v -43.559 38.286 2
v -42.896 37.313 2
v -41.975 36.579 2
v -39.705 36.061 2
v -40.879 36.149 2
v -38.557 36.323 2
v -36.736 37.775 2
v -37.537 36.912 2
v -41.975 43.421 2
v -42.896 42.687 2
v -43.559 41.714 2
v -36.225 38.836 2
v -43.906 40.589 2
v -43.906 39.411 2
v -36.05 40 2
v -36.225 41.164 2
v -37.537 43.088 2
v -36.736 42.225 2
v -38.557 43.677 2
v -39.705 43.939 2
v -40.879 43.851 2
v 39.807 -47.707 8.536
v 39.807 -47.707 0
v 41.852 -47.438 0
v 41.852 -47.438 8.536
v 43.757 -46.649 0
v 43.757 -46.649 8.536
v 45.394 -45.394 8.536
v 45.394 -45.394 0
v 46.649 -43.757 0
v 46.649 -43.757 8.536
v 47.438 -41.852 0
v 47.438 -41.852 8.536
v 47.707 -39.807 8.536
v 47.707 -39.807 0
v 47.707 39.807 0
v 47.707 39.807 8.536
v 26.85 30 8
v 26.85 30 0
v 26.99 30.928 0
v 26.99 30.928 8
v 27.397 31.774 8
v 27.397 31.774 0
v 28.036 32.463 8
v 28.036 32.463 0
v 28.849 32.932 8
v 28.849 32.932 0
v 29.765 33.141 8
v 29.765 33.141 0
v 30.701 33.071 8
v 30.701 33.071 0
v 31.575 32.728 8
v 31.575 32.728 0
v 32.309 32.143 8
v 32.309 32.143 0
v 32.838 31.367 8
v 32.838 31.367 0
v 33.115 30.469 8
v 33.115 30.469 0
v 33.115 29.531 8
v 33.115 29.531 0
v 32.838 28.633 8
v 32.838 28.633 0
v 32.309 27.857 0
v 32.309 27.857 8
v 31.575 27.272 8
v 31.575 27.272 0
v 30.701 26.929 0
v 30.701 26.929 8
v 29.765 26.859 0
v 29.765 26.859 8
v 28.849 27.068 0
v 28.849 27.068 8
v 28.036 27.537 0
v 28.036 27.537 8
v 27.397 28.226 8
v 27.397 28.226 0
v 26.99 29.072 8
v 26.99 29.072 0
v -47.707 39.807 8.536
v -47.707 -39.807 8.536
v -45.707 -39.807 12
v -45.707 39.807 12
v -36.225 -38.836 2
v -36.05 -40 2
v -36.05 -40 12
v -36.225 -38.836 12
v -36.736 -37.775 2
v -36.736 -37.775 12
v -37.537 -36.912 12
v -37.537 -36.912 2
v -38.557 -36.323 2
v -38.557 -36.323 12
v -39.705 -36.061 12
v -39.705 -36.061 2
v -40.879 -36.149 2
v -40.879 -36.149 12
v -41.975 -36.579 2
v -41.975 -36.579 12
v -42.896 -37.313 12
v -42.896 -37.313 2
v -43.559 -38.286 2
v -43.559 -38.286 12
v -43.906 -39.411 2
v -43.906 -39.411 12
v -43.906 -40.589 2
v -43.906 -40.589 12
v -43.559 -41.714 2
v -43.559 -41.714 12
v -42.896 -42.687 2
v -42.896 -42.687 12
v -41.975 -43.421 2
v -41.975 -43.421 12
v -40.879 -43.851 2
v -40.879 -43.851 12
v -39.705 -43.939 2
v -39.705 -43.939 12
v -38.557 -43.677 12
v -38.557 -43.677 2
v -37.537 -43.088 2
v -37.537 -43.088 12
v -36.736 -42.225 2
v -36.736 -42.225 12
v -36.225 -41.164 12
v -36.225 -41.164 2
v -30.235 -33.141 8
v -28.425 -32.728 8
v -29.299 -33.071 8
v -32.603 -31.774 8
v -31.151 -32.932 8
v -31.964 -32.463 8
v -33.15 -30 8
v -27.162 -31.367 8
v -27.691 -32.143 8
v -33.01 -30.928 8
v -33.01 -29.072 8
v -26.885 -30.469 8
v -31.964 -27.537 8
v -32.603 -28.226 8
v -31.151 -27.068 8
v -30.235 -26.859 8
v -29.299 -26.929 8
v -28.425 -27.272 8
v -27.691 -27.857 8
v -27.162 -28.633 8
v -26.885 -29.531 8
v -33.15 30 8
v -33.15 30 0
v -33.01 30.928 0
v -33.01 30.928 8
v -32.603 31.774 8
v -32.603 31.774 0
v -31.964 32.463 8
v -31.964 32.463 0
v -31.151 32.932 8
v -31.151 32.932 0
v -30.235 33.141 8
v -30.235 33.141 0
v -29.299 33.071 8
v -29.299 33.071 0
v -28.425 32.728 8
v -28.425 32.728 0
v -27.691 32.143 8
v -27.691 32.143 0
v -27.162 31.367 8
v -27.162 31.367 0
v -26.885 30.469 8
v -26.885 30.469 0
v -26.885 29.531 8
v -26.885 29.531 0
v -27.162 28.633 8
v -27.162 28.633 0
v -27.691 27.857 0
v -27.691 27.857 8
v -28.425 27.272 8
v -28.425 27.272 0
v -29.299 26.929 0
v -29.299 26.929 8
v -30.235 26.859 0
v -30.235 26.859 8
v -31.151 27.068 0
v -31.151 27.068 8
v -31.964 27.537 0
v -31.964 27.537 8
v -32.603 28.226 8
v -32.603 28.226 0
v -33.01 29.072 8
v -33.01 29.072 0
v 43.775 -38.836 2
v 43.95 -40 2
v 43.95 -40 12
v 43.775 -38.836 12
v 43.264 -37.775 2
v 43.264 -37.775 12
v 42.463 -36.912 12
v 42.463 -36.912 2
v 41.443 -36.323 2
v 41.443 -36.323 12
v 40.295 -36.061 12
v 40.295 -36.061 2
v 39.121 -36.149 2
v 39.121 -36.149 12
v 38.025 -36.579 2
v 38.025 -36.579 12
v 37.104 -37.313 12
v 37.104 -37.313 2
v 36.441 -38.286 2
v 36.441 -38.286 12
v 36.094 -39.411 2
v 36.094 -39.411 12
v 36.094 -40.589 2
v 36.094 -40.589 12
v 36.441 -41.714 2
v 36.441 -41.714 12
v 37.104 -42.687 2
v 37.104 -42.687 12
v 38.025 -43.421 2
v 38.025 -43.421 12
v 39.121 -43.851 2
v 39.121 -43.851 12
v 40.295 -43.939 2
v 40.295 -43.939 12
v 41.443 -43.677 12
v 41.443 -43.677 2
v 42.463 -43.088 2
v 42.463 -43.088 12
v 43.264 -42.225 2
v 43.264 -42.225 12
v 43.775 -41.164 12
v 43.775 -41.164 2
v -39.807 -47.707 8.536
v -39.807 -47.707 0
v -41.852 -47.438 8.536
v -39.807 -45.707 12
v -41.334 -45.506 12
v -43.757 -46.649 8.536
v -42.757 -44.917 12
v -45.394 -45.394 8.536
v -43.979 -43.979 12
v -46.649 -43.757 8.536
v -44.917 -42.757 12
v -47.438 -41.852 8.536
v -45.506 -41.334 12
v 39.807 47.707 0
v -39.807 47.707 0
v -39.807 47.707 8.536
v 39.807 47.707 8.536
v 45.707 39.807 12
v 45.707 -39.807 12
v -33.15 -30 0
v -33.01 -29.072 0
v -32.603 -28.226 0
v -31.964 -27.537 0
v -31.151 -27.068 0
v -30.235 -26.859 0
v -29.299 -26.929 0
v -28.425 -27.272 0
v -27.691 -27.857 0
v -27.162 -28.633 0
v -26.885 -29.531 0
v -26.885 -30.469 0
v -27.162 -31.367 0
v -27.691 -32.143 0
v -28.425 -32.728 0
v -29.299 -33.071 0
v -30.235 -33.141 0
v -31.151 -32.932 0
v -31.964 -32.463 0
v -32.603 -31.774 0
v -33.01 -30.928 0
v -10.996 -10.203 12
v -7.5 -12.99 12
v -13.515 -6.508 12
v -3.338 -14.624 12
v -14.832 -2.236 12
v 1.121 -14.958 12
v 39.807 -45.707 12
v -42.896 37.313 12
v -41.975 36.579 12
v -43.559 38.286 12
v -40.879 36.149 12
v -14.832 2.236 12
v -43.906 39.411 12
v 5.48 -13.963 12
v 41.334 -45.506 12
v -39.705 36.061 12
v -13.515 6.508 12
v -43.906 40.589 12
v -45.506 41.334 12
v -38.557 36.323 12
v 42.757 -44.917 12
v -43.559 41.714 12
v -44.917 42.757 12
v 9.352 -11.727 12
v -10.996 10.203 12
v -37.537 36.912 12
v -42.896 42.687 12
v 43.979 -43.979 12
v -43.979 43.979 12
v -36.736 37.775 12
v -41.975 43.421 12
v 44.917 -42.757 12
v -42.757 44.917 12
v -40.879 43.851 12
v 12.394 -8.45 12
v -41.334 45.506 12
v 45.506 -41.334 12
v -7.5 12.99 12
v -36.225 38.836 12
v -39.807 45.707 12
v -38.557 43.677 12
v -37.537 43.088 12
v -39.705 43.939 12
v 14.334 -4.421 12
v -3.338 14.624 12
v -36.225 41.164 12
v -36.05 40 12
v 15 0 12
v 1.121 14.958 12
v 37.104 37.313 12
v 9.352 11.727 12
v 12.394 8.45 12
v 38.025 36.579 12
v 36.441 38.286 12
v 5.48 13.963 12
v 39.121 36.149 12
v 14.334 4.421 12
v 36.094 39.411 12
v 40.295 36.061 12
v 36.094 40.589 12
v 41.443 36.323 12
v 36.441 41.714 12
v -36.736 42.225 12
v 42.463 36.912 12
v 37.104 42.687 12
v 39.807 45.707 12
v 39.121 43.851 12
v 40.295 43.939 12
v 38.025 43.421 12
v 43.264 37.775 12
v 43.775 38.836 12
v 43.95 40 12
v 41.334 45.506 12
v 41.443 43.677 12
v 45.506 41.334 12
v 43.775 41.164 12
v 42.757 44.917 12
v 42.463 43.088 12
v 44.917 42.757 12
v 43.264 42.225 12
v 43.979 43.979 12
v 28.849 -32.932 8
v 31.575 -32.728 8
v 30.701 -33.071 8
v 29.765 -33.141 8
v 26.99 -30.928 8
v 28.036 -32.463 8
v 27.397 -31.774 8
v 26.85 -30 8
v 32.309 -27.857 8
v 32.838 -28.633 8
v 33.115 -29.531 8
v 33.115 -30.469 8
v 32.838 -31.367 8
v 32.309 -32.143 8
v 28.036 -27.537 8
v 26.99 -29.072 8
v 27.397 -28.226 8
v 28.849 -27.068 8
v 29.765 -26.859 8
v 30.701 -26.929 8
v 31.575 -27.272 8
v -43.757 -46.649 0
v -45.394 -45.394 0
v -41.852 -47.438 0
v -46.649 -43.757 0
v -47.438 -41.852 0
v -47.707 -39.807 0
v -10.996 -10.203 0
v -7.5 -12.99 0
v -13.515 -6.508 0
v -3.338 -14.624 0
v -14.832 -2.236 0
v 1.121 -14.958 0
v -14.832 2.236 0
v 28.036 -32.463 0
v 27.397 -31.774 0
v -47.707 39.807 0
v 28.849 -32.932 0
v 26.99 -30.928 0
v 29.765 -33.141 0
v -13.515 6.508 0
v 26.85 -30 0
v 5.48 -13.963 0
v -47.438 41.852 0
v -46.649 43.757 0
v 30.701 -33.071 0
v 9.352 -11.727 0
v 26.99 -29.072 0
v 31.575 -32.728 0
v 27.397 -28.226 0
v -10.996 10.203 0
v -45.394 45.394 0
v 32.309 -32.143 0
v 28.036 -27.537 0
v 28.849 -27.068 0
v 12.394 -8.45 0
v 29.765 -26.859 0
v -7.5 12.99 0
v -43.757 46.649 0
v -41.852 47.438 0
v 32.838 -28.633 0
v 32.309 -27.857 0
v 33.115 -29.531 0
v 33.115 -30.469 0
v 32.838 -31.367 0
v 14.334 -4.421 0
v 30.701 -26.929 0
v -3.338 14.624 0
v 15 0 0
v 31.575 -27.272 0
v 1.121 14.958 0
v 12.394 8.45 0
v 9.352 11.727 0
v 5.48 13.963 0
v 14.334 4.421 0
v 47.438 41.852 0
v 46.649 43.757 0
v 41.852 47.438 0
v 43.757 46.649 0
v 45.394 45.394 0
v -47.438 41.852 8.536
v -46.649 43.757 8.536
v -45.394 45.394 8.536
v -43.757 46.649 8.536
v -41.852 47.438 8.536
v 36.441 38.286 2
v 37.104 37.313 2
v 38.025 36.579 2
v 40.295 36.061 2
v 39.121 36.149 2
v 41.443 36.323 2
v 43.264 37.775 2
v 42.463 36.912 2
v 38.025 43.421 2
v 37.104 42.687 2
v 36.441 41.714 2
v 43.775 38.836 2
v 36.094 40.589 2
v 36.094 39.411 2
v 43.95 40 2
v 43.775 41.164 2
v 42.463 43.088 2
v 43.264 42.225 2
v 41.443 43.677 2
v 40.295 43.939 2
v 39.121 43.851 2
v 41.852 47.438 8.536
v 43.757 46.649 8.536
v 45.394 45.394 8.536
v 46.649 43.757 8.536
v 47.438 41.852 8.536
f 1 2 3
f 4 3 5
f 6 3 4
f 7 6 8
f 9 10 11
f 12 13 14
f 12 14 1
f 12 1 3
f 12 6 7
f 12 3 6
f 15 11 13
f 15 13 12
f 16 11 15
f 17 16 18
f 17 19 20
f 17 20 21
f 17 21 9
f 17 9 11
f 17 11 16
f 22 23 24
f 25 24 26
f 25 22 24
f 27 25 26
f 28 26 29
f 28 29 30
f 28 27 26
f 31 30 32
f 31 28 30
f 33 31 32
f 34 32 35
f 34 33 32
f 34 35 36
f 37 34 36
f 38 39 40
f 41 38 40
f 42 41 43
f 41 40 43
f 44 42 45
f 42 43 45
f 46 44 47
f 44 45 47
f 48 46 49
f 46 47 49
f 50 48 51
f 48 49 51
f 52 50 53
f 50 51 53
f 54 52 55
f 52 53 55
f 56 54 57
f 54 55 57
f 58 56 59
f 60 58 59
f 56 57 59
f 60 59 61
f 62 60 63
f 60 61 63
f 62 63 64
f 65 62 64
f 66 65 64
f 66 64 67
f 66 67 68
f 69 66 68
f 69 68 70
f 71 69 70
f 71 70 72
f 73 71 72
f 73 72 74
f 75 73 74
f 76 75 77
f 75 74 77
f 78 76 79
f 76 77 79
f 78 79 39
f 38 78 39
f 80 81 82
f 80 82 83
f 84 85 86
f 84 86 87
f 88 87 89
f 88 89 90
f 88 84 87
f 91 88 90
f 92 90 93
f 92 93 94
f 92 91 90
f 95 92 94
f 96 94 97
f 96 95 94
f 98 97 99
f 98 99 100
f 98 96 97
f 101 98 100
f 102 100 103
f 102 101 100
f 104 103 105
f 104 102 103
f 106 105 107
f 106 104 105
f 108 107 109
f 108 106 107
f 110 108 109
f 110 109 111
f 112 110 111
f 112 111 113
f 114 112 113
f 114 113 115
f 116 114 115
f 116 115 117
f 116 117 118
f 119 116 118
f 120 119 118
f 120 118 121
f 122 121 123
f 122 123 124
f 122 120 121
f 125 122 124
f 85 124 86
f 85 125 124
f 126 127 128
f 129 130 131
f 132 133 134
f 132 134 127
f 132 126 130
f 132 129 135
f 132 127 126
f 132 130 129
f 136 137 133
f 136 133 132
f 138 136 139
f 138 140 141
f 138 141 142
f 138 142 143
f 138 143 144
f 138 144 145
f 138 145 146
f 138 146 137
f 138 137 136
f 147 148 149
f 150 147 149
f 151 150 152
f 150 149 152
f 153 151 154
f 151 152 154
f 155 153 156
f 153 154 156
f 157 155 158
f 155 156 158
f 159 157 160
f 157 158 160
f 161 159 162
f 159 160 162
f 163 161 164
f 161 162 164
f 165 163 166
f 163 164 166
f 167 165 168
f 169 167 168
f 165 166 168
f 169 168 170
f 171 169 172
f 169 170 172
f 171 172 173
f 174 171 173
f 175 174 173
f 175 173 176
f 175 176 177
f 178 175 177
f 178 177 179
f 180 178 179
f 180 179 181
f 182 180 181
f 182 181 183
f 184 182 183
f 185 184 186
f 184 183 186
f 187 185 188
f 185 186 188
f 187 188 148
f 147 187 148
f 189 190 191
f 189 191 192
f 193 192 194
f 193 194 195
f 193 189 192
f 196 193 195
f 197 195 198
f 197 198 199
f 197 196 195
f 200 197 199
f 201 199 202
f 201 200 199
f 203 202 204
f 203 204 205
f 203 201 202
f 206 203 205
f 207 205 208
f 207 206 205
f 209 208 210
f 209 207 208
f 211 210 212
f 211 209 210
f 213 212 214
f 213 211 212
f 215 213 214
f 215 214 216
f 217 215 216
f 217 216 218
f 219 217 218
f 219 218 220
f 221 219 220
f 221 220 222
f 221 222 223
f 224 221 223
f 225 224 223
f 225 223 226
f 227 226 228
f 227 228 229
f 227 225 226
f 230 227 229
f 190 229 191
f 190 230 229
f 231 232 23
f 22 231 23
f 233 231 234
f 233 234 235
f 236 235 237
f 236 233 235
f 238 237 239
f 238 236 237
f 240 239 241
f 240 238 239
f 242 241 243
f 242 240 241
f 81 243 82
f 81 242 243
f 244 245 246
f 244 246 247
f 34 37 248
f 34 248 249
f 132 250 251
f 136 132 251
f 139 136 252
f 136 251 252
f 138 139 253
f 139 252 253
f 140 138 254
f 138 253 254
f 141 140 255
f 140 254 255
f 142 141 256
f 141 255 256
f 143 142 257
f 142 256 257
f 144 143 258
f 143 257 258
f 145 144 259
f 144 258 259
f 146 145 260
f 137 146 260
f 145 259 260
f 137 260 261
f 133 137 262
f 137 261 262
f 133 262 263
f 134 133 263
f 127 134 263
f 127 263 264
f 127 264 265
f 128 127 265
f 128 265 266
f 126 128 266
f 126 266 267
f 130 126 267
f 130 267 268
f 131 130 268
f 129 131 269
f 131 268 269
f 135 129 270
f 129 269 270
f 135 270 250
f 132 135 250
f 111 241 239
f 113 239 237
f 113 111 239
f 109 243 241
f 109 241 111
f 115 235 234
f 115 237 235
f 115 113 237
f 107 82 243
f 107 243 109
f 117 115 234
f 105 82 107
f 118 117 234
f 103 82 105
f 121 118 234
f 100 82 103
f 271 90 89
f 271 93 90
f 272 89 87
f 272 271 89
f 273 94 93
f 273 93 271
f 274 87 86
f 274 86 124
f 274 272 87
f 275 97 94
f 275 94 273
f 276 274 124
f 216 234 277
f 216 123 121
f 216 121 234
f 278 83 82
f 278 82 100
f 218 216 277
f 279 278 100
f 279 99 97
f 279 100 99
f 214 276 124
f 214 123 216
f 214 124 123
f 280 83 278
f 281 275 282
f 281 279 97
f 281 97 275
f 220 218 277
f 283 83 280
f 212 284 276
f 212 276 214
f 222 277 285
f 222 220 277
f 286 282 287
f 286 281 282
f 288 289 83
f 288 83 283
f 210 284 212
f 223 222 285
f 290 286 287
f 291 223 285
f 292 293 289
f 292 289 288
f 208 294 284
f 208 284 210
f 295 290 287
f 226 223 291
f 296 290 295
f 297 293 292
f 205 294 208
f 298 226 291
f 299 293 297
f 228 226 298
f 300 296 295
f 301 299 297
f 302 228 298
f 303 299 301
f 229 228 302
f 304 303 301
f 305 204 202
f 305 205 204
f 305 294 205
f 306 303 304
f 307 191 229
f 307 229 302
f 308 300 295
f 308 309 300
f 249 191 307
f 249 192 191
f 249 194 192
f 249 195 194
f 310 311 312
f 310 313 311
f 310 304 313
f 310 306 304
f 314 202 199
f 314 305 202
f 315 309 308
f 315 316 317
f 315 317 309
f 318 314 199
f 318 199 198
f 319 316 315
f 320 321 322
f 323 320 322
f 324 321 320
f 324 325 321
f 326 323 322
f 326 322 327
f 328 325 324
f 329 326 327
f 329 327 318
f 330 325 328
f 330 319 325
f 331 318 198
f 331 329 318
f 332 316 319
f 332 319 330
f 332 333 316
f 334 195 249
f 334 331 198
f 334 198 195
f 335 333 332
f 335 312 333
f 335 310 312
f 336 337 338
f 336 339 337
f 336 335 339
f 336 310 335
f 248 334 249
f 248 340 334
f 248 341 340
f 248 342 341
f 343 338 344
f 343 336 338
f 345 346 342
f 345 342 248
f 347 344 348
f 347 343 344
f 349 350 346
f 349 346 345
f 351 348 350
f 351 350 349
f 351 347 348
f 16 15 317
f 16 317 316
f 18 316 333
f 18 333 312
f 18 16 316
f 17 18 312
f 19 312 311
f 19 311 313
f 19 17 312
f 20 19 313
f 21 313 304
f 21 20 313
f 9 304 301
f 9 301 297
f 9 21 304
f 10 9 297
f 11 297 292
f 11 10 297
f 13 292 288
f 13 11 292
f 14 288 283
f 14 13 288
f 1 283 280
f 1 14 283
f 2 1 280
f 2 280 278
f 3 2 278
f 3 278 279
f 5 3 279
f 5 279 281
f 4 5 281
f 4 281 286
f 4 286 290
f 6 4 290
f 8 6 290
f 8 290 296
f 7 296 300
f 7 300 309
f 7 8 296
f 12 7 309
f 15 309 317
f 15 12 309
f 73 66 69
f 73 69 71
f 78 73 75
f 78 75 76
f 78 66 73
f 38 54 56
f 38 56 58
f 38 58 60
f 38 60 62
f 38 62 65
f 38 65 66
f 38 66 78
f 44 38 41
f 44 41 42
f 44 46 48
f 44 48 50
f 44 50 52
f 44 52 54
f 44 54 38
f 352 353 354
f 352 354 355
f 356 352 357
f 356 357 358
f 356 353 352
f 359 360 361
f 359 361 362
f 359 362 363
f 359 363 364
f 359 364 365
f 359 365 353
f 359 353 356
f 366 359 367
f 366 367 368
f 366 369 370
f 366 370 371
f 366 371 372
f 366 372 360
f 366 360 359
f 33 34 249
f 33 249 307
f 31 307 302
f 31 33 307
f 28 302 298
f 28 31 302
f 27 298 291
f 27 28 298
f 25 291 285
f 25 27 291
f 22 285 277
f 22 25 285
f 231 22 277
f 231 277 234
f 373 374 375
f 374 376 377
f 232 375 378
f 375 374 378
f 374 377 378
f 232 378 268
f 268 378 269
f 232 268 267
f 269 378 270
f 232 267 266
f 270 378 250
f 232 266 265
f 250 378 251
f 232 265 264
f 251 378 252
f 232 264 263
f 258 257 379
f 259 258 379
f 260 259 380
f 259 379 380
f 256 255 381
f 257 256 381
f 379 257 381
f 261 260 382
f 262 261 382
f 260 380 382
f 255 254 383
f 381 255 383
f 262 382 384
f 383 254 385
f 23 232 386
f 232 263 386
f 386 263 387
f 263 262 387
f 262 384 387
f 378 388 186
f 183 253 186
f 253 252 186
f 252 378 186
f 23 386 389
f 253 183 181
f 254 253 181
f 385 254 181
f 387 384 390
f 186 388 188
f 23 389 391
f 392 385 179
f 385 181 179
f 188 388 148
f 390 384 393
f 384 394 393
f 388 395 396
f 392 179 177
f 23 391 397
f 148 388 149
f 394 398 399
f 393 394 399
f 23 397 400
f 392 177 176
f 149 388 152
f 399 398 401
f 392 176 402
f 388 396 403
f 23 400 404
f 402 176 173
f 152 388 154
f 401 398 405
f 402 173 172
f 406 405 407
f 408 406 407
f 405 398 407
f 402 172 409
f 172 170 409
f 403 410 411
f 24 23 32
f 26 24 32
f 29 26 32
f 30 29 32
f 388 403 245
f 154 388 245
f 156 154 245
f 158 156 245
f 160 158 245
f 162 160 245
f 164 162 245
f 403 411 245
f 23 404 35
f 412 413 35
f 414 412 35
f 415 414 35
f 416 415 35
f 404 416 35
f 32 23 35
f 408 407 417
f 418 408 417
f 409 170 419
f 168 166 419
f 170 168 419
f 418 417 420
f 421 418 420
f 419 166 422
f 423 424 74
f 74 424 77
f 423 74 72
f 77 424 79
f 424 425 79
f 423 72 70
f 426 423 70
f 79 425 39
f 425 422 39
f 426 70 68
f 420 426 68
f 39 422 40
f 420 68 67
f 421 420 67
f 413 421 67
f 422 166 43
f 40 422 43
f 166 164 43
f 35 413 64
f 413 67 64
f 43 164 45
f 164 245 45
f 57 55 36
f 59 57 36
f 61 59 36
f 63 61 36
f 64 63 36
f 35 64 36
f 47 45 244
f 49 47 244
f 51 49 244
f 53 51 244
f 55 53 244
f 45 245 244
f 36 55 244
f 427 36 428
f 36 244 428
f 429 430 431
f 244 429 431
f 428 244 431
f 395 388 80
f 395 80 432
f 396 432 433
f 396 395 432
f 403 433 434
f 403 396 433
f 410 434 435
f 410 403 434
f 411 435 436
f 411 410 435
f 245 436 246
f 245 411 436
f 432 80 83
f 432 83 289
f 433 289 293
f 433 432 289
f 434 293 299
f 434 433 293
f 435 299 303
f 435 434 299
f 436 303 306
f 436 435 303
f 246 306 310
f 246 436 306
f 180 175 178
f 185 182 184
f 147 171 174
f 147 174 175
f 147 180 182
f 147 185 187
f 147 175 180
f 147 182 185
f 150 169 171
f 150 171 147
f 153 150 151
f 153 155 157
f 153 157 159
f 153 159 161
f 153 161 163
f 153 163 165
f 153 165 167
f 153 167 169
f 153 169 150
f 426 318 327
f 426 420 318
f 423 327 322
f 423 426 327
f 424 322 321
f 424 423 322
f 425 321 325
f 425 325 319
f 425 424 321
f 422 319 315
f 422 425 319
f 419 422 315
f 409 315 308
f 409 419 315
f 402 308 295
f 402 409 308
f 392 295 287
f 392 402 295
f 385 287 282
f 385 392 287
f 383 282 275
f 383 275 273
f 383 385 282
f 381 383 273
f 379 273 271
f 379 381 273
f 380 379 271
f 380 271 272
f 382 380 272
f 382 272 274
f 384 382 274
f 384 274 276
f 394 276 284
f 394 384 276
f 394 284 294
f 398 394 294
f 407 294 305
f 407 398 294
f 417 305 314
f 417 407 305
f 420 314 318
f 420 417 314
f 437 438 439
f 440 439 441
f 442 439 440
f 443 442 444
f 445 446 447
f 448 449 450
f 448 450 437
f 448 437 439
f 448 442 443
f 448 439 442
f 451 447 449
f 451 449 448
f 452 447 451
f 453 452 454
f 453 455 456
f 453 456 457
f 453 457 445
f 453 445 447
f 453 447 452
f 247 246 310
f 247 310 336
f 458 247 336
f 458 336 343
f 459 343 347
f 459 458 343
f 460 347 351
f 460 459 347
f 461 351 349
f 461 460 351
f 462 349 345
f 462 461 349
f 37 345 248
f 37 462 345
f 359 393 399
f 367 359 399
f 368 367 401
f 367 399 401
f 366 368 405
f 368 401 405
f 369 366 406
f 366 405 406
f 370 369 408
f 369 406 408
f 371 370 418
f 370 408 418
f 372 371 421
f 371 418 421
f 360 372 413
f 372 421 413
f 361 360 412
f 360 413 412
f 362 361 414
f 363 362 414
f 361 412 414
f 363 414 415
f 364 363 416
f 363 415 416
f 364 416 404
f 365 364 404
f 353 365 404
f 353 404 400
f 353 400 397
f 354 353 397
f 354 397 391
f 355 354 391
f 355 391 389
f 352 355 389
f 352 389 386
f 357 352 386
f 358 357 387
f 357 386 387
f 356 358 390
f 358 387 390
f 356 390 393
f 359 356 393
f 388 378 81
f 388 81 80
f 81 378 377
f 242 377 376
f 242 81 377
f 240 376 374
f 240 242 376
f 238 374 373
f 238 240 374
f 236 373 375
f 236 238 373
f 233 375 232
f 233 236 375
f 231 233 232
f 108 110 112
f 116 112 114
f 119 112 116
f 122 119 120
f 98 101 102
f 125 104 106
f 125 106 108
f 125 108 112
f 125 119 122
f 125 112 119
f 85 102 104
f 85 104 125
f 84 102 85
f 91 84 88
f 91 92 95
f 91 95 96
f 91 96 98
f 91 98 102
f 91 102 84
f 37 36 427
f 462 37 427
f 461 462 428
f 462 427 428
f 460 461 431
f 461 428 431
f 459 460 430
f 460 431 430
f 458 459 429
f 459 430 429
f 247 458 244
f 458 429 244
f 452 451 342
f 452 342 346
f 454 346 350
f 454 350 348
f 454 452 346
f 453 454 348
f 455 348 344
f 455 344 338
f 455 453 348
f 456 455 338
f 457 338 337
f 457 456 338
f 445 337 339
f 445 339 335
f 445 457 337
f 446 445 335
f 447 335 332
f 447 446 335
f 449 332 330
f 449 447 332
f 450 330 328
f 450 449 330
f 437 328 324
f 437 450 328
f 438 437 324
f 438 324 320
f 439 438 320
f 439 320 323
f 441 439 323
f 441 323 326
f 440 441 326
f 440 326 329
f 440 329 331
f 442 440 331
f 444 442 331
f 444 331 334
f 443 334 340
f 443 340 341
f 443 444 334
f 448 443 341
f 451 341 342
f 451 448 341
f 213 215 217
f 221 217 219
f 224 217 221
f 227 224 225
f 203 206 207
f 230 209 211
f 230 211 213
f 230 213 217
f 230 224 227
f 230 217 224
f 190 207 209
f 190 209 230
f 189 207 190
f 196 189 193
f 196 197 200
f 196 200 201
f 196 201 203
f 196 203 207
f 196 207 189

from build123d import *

# Parameters (mm, degrees)
ESQUISSE1_W             = 95.41492783
ESQUISSE1_H             = 95.41492783
ESQUISSE1_R             = 3.95
ESQUISSE1_R_2           = 15
BOSS_EXTRU_1_DEPTH      = 2
BOSS_EXTRU_2_START      = 2
ESQUISSE1_3_W           = 95.41492783
ESQUISSE1_3_H           = 95.41492783
ESQUISSE1_3_R           = 15
ESQUISSE1_3_R_2         = 3.95
BOSS_EXTRU_2_DEPTH      = 10
CONG_1_R                = 7.9
CHANFREIN1_SIZE         = 2
CHANFREIN1_SIZE2        = 3.464101615
ESQUISSE4_R             = 3.15
ENL_V_MAT_EXTRU_2_DEPTH = 8


with BuildPart() as part:
    # Esquisse1 → Boss.-Extru.1 (new body)
    with BuildSketch(Plane.XY):
        Rectangle(ESQUISSE1_W, ESQUISSE1_H)
        with Locations((-40, -40)):
            Circle(ESQUISSE1_R, mode=Mode.SUBTRACT)
        with Locations((40, -40)):
            Circle(ESQUISSE1_R, mode=Mode.SUBTRACT)
        with Locations((40, 40)):
            Circle(ESQUISSE1_R, mode=Mode.SUBTRACT)
        with Locations((-40, 40)):
            Circle(ESQUISSE1_R, mode=Mode.SUBTRACT)
        Circle(ESQUISSE1_R_2, mode=Mode.SUBTRACT)
        with Locations((-40, -40)):
            Circle(ESQUISSE1_R)
        with Locations((40, -40)):
            Circle(ESQUISSE1_R)
        with Locations((40, 40)):
            Circle(ESQUISSE1_R)
        with Locations((-40, 40)):
            Circle(ESQUISSE1_R)
    extrude(amount=BOSS_EXTRU_1_DEPTH)

    # Esquisse1<3> → Boss.-Extru.2 (add)
    with BuildSketch(Plane.XY.offset(BOSS_EXTRU_2_START)):
        Rectangle(ESQUISSE1_3_W, ESQUISSE1_3_H)
        Circle(ESQUISSE1_3_R, mode=Mode.SUBTRACT)
        with Locations((-40, 40)):
            Circle(ESQUISSE1_3_R_2, mode=Mode.SUBTRACT)
        with Locations((40, 40)):
            Circle(ESQUISSE1_3_R_2, mode=Mode.SUBTRACT)
        with Locations((40, -40)):
            Circle(ESQUISSE1_3_R_2, mode=Mode.SUBTRACT)
        with Locations((-40, -40)):
            Circle(ESQUISSE1_3_R_2, mode=Mode.SUBTRACT)
    extrude(amount=BOSS_EXTRU_2_DEPTH)

    # Congé1
    cong_1_edges = [part.edges().sort_by_distance(p)[0] for p in [
        (-47.707463915, -47.707463915, 6),
        (-47.707463915, 47.707463915, 6),
        (47.707463915, 47.707463915, 6),
        (47.707463915, -47.707463915, 6),
    ]]
    fillet(cong_1_edges, radius=CONG_1_R)

    # Chanfrein1
    chanfrein1_edges = [part.edges().sort_by_distance(p)[0] for p in [
        (0, 47.707463915, 12),
        (47.707463915, 0, 12),
        (-47.707463915, 0, 12),
        (0, -47.707463915, 12),
        (-45.393607486, 45.393607486, 12),
        (-45.393607486, -45.393607486, 12),
        (45.393607486, -45.393607486, 12),
        (45.393607486, 45.393607486, 12),
    ]]
    chanfrein1_side = [part.faces().sort_by_distance(p)[0] for p in [
        (0, -46.358093065, 12),
    ]]
    chamfer(chanfrein1_edges, length=CHANFREIN1_SIZE, length2=CHANFREIN1_SIZE2, reference=chanfrein1_side[0])

    # Esquisse4 → Enlèv. mat.-Extru.2 (cut)
    with BuildSketch(Plane(origin=(0, 0, 0), x_dir=(-1, 0, 0), z_dir=(0, 0, -1))):
        with Locations((-30, 30)):
            Circle(ESQUISSE4_R)
        with Locations((-30, -30)):
            Circle(ESQUISSE4_R)
        with Locations((30, -30)):
            Circle(ESQUISSE4_R)
        with Locations((30, 30)):
            Circle(ESQUISSE4_R)
    extrude(amount=-ENL_V_MAT_EXTRU_2_DEPTH, mode=Mode.SUBTRACT)


solid = part.part
